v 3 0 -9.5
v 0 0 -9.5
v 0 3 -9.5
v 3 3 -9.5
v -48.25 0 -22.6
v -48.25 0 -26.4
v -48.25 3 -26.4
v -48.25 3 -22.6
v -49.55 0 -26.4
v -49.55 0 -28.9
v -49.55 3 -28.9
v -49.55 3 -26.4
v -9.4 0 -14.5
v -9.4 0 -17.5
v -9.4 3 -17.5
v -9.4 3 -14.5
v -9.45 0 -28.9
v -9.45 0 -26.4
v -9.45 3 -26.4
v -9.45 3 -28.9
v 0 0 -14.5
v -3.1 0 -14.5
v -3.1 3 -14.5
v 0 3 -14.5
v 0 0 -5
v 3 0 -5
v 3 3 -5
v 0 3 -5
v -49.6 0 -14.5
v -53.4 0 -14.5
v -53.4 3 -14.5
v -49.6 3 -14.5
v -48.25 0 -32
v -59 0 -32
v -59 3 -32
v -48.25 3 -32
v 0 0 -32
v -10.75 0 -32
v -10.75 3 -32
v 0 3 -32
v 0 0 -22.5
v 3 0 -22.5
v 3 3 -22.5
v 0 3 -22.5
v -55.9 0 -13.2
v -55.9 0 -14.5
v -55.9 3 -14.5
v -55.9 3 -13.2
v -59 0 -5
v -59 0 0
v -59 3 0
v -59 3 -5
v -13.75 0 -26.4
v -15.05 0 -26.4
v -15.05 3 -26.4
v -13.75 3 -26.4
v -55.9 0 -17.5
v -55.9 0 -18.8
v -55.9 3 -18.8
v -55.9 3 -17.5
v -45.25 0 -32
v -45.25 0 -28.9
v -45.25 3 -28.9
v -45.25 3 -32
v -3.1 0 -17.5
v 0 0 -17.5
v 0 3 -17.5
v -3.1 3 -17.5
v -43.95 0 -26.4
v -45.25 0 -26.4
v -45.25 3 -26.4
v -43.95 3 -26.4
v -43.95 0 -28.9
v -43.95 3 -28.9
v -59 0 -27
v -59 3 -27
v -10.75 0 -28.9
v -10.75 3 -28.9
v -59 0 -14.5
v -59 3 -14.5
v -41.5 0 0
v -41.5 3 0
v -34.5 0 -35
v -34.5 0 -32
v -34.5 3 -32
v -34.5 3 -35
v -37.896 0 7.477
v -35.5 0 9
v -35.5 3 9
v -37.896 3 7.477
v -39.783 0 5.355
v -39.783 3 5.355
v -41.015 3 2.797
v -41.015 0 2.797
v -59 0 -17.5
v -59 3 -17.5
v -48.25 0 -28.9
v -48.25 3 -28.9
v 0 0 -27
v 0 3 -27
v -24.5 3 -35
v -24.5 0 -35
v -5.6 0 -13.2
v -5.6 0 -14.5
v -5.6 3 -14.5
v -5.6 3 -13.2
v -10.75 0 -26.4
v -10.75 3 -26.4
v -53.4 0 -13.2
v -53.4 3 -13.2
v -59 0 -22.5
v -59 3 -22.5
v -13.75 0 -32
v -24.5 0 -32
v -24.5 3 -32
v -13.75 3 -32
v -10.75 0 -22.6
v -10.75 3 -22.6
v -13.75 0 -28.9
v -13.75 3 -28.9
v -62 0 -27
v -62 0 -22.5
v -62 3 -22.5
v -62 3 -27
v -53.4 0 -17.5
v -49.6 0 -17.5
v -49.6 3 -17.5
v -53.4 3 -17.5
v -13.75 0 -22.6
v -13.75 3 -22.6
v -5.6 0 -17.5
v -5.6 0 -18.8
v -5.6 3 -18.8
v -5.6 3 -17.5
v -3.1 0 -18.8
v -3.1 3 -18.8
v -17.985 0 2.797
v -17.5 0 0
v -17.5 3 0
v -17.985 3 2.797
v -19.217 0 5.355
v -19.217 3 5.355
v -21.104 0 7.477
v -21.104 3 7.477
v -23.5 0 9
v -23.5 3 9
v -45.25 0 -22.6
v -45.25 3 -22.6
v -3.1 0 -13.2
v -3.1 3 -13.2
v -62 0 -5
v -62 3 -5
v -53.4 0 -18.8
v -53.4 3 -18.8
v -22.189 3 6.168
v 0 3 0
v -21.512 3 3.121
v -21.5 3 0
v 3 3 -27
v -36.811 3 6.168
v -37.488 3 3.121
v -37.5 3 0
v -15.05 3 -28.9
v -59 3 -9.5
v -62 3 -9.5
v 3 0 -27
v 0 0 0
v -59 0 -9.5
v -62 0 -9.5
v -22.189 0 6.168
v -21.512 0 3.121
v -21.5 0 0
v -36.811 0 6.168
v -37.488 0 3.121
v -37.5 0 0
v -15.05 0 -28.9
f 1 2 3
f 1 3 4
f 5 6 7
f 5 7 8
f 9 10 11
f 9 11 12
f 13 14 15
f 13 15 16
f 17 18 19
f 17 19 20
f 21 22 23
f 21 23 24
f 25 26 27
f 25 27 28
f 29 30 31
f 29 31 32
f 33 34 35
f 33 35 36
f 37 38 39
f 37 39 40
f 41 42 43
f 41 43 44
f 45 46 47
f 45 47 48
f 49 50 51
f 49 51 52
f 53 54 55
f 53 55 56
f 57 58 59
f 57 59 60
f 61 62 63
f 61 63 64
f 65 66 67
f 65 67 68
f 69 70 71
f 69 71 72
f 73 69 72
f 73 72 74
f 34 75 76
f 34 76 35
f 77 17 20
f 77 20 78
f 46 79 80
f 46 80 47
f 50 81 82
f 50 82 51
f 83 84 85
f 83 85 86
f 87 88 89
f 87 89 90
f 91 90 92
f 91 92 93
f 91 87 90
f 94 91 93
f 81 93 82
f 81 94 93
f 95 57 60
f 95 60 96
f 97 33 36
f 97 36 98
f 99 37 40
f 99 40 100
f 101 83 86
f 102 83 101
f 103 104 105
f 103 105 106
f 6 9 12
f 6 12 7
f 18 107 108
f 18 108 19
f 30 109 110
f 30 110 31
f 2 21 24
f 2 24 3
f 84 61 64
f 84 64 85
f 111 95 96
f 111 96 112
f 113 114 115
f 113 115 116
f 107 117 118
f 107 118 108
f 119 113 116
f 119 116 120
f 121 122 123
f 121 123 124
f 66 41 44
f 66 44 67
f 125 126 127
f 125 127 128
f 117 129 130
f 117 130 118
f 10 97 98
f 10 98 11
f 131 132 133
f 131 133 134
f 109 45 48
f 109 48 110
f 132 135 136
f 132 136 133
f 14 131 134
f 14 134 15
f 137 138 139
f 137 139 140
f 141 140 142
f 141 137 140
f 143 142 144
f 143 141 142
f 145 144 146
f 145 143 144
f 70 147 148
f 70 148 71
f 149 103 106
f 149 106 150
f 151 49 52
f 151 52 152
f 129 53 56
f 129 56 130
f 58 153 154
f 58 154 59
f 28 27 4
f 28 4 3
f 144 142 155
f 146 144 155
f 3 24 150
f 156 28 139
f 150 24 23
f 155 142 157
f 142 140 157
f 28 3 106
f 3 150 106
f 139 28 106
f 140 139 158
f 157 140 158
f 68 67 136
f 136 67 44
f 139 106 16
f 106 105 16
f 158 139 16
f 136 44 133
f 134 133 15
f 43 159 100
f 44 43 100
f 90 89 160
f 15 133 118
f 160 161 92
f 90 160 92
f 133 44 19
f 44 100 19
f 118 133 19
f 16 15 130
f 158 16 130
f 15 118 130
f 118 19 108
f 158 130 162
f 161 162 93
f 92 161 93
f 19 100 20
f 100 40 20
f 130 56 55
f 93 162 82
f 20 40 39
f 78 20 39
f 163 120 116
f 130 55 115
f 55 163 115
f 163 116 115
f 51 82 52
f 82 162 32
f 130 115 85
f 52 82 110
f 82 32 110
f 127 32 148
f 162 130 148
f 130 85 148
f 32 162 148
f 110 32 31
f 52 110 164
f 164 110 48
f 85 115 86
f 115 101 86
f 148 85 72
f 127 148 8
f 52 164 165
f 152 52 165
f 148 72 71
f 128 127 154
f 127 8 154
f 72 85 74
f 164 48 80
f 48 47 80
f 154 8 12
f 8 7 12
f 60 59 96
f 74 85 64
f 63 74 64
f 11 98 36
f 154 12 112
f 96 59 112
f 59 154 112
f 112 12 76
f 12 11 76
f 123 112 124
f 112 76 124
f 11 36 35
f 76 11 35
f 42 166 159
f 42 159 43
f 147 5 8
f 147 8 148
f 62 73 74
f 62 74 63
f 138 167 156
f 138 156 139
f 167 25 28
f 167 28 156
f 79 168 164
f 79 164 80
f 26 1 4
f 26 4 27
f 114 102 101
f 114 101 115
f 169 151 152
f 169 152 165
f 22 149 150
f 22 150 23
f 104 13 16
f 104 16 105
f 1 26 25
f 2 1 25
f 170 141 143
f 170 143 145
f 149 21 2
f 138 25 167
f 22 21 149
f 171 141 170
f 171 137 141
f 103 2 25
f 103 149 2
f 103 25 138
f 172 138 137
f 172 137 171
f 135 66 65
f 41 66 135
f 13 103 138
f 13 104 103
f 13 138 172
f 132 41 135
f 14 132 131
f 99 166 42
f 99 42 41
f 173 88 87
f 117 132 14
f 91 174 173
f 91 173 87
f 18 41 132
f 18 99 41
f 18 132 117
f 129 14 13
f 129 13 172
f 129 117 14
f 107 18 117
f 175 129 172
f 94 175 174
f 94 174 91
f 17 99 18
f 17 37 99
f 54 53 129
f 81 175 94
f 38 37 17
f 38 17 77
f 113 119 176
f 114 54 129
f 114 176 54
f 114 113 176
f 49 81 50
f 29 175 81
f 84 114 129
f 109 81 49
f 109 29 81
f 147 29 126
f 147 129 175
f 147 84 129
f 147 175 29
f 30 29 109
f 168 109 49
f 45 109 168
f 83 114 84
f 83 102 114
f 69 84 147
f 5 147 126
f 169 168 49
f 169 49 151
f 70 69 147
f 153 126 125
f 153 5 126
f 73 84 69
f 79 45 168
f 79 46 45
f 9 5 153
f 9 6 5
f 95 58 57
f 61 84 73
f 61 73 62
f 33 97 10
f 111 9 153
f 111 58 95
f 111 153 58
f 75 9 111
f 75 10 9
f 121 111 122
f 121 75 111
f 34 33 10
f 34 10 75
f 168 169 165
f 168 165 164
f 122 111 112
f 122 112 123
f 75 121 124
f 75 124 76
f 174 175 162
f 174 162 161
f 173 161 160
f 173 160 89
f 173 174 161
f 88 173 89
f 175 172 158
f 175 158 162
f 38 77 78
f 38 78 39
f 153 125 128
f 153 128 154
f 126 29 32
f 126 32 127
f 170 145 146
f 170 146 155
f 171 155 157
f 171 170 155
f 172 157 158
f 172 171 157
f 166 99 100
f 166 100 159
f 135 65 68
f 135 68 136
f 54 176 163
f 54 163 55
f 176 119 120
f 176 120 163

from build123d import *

# Parameters (mm, degrees)
BOSS_EXTRUDE1_DEPTH = 3


with BuildPart() as part:
    # Sketch1 → Boss-Extrude1 (new body)
    with BuildSketch(Plane(origin=(0, 0, 0), x_dir=(1, 0, 0), z_dir=(0, 1, 0))):
        with BuildLine():
            Line((0, 27), (3, 27))
            Line((3, 27), (3, 22.5))
            Line((3, 22.5), (0, 22.5))
            Line((0, 22.5), (0, 17.5))
            Line((0, 17.5), (-3.1, 17.5))
            Line((-3.1, 17.5), (-3.1, 18.8))
            Line((-3.1, 18.8), (-5.6, 18.8))
            Line((-5.6, 18.8), (-5.6, 17.5))
            Line((-5.6, 17.5), (-9.4, 17.5))
            Line((-9.4, 17.5), (-9.4, 14.5))
            Line((-9.4, 14.5), (-5.6, 14.5))
            Line((-5.6, 14.5), (-5.6, 13.2))
            Line((-5.6, 13.2), (-3.1, 13.2))
            Line((-3.1, 13.2), (-3.1, 14.5))
            Line((-3.1, 14.5), (0, 14.5))
            Line((0, 14.5), (0, 9.5))
            Line((0, 9.5), (3, 9.5))
            Line((3, 9.5), (3, 5))
            Line((3, 5), (0, 5))
            Line((0, 5), (0, 0))
            Line((0, 0), (-17.5, 0))
            ThreePointArc((-17.5, 0), (-19.217483451, -5.355011032), (-23.5, -9))
            ThreePointArc((-23.5, -9), (-21.768352481, -4.662588338), (-21.5, 0))
            Line((-21.5, 0), (-37.5, 0))
            ThreePointArc((-37.5, 0), (-37.231647519, -4.662588338), (-35.5, -9))
            ThreePointArc((-35.5, -9), (-39.782516549, -5.355011032), (-41.5, 0))
            Line((-41.5, 0), (-59, 0))
            Line((-59, 0), (-59, 5))
            Line((-59, 5), (-62, 5))
            Line((-62, 5), (-62, 9.5))
            Line((-62, 9.5), (-59, 9.5))
            Line((-59, 9.5), (-59, 14.5))
            Line((-59, 14.5), (-55.9, 14.5))
            Line((-55.9, 14.5), (-55.9, 13.2))
            Line((-55.9, 13.2), (-53.4, 13.2))
            Line((-53.4, 13.2), (-53.4, 14.5))
            Line((-53.4, 14.5), (-49.6, 14.5))
            Line((-49.6, 14.5), (-49.6, 17.5))
            Line((-49.6, 17.5), (-53.4, 17.5))
            Line((-53.4, 17.5), (-53.4, 18.8))
            Line((-53.4, 18.8), (-55.9, 18.8))
            Line((-55.9, 18.8), (-55.9, 17.5))
            Line((-55.9, 17.5), (-59, 17.5))
            Line((-59, 17.5), (-59, 22.5))
            Line((-59, 22.5), (-62, 22.5))
            Line((-62, 22.5), (-62, 27))
            Line((-62, 27), (-59, 27))
            Line((-59, 27), (-59, 32))
            Line((-59, 32), (-48.25, 32))
            Line((-48.25, 32), (-48.25, 28.9))
            Line((-48.25, 28.9), (-49.55, 28.9))
            Line((-49.55, 28.9), (-49.55, 26.4))
            Line((-49.55, 26.4), (-48.25, 26.4))
            Line((-48.25, 26.4), (-48.25, 22.6))
            Line((-48.25, 22.6), (-45.25, 22.6))
            Line((-45.25, 22.6), (-45.25, 26.4))
            Line((-45.25, 26.4), (-43.95, 26.4))
            Line((-43.95, 26.4), (-43.95, 28.9))
            Line((-43.95, 28.9), (-45.25, 28.9))
            Line((-45.25, 28.9), (-45.25, 32))
            Line((-45.25, 32), (-34.5, 32))
            Line((-34.5, 32), (-34.5, 35))
            Line((-34.5, 35), (-24.5, 35))
            Line((-24.5, 35), (-24.5, 32))
            Line((-24.5, 32), (-13.75, 32))
            Line((-13.75, 32), (-13.75, 28.9))
            Line((-13.75, 28.9), (-15.05, 28.9))
            Line((-15.05, 28.9), (-15.05, 26.4))
            Line((-15.05, 26.4), (-13.75, 26.4))
            Line((-13.75, 26.4), (-13.75, 22.6))
            Line((-13.75, 22.6), (-10.75, 22.6))
            Line((-10.75, 22.6), (-10.75, 26.4))
            Line((-10.75, 26.4), (-9.45, 26.4))
            Line((-9.45, 26.4), (-9.45, 28.9))
            Line((-9.45, 28.9), (-10.75, 28.9))
            Line((-10.75, 28.9), (-10.75, 32))
            Line((-10.75, 32), (0, 32))
            Line((0, 32), (0, 27))
        make_face()
    extrude(amount=BOSS_EXTRUDE1_DEPTH)


solid = part.part
